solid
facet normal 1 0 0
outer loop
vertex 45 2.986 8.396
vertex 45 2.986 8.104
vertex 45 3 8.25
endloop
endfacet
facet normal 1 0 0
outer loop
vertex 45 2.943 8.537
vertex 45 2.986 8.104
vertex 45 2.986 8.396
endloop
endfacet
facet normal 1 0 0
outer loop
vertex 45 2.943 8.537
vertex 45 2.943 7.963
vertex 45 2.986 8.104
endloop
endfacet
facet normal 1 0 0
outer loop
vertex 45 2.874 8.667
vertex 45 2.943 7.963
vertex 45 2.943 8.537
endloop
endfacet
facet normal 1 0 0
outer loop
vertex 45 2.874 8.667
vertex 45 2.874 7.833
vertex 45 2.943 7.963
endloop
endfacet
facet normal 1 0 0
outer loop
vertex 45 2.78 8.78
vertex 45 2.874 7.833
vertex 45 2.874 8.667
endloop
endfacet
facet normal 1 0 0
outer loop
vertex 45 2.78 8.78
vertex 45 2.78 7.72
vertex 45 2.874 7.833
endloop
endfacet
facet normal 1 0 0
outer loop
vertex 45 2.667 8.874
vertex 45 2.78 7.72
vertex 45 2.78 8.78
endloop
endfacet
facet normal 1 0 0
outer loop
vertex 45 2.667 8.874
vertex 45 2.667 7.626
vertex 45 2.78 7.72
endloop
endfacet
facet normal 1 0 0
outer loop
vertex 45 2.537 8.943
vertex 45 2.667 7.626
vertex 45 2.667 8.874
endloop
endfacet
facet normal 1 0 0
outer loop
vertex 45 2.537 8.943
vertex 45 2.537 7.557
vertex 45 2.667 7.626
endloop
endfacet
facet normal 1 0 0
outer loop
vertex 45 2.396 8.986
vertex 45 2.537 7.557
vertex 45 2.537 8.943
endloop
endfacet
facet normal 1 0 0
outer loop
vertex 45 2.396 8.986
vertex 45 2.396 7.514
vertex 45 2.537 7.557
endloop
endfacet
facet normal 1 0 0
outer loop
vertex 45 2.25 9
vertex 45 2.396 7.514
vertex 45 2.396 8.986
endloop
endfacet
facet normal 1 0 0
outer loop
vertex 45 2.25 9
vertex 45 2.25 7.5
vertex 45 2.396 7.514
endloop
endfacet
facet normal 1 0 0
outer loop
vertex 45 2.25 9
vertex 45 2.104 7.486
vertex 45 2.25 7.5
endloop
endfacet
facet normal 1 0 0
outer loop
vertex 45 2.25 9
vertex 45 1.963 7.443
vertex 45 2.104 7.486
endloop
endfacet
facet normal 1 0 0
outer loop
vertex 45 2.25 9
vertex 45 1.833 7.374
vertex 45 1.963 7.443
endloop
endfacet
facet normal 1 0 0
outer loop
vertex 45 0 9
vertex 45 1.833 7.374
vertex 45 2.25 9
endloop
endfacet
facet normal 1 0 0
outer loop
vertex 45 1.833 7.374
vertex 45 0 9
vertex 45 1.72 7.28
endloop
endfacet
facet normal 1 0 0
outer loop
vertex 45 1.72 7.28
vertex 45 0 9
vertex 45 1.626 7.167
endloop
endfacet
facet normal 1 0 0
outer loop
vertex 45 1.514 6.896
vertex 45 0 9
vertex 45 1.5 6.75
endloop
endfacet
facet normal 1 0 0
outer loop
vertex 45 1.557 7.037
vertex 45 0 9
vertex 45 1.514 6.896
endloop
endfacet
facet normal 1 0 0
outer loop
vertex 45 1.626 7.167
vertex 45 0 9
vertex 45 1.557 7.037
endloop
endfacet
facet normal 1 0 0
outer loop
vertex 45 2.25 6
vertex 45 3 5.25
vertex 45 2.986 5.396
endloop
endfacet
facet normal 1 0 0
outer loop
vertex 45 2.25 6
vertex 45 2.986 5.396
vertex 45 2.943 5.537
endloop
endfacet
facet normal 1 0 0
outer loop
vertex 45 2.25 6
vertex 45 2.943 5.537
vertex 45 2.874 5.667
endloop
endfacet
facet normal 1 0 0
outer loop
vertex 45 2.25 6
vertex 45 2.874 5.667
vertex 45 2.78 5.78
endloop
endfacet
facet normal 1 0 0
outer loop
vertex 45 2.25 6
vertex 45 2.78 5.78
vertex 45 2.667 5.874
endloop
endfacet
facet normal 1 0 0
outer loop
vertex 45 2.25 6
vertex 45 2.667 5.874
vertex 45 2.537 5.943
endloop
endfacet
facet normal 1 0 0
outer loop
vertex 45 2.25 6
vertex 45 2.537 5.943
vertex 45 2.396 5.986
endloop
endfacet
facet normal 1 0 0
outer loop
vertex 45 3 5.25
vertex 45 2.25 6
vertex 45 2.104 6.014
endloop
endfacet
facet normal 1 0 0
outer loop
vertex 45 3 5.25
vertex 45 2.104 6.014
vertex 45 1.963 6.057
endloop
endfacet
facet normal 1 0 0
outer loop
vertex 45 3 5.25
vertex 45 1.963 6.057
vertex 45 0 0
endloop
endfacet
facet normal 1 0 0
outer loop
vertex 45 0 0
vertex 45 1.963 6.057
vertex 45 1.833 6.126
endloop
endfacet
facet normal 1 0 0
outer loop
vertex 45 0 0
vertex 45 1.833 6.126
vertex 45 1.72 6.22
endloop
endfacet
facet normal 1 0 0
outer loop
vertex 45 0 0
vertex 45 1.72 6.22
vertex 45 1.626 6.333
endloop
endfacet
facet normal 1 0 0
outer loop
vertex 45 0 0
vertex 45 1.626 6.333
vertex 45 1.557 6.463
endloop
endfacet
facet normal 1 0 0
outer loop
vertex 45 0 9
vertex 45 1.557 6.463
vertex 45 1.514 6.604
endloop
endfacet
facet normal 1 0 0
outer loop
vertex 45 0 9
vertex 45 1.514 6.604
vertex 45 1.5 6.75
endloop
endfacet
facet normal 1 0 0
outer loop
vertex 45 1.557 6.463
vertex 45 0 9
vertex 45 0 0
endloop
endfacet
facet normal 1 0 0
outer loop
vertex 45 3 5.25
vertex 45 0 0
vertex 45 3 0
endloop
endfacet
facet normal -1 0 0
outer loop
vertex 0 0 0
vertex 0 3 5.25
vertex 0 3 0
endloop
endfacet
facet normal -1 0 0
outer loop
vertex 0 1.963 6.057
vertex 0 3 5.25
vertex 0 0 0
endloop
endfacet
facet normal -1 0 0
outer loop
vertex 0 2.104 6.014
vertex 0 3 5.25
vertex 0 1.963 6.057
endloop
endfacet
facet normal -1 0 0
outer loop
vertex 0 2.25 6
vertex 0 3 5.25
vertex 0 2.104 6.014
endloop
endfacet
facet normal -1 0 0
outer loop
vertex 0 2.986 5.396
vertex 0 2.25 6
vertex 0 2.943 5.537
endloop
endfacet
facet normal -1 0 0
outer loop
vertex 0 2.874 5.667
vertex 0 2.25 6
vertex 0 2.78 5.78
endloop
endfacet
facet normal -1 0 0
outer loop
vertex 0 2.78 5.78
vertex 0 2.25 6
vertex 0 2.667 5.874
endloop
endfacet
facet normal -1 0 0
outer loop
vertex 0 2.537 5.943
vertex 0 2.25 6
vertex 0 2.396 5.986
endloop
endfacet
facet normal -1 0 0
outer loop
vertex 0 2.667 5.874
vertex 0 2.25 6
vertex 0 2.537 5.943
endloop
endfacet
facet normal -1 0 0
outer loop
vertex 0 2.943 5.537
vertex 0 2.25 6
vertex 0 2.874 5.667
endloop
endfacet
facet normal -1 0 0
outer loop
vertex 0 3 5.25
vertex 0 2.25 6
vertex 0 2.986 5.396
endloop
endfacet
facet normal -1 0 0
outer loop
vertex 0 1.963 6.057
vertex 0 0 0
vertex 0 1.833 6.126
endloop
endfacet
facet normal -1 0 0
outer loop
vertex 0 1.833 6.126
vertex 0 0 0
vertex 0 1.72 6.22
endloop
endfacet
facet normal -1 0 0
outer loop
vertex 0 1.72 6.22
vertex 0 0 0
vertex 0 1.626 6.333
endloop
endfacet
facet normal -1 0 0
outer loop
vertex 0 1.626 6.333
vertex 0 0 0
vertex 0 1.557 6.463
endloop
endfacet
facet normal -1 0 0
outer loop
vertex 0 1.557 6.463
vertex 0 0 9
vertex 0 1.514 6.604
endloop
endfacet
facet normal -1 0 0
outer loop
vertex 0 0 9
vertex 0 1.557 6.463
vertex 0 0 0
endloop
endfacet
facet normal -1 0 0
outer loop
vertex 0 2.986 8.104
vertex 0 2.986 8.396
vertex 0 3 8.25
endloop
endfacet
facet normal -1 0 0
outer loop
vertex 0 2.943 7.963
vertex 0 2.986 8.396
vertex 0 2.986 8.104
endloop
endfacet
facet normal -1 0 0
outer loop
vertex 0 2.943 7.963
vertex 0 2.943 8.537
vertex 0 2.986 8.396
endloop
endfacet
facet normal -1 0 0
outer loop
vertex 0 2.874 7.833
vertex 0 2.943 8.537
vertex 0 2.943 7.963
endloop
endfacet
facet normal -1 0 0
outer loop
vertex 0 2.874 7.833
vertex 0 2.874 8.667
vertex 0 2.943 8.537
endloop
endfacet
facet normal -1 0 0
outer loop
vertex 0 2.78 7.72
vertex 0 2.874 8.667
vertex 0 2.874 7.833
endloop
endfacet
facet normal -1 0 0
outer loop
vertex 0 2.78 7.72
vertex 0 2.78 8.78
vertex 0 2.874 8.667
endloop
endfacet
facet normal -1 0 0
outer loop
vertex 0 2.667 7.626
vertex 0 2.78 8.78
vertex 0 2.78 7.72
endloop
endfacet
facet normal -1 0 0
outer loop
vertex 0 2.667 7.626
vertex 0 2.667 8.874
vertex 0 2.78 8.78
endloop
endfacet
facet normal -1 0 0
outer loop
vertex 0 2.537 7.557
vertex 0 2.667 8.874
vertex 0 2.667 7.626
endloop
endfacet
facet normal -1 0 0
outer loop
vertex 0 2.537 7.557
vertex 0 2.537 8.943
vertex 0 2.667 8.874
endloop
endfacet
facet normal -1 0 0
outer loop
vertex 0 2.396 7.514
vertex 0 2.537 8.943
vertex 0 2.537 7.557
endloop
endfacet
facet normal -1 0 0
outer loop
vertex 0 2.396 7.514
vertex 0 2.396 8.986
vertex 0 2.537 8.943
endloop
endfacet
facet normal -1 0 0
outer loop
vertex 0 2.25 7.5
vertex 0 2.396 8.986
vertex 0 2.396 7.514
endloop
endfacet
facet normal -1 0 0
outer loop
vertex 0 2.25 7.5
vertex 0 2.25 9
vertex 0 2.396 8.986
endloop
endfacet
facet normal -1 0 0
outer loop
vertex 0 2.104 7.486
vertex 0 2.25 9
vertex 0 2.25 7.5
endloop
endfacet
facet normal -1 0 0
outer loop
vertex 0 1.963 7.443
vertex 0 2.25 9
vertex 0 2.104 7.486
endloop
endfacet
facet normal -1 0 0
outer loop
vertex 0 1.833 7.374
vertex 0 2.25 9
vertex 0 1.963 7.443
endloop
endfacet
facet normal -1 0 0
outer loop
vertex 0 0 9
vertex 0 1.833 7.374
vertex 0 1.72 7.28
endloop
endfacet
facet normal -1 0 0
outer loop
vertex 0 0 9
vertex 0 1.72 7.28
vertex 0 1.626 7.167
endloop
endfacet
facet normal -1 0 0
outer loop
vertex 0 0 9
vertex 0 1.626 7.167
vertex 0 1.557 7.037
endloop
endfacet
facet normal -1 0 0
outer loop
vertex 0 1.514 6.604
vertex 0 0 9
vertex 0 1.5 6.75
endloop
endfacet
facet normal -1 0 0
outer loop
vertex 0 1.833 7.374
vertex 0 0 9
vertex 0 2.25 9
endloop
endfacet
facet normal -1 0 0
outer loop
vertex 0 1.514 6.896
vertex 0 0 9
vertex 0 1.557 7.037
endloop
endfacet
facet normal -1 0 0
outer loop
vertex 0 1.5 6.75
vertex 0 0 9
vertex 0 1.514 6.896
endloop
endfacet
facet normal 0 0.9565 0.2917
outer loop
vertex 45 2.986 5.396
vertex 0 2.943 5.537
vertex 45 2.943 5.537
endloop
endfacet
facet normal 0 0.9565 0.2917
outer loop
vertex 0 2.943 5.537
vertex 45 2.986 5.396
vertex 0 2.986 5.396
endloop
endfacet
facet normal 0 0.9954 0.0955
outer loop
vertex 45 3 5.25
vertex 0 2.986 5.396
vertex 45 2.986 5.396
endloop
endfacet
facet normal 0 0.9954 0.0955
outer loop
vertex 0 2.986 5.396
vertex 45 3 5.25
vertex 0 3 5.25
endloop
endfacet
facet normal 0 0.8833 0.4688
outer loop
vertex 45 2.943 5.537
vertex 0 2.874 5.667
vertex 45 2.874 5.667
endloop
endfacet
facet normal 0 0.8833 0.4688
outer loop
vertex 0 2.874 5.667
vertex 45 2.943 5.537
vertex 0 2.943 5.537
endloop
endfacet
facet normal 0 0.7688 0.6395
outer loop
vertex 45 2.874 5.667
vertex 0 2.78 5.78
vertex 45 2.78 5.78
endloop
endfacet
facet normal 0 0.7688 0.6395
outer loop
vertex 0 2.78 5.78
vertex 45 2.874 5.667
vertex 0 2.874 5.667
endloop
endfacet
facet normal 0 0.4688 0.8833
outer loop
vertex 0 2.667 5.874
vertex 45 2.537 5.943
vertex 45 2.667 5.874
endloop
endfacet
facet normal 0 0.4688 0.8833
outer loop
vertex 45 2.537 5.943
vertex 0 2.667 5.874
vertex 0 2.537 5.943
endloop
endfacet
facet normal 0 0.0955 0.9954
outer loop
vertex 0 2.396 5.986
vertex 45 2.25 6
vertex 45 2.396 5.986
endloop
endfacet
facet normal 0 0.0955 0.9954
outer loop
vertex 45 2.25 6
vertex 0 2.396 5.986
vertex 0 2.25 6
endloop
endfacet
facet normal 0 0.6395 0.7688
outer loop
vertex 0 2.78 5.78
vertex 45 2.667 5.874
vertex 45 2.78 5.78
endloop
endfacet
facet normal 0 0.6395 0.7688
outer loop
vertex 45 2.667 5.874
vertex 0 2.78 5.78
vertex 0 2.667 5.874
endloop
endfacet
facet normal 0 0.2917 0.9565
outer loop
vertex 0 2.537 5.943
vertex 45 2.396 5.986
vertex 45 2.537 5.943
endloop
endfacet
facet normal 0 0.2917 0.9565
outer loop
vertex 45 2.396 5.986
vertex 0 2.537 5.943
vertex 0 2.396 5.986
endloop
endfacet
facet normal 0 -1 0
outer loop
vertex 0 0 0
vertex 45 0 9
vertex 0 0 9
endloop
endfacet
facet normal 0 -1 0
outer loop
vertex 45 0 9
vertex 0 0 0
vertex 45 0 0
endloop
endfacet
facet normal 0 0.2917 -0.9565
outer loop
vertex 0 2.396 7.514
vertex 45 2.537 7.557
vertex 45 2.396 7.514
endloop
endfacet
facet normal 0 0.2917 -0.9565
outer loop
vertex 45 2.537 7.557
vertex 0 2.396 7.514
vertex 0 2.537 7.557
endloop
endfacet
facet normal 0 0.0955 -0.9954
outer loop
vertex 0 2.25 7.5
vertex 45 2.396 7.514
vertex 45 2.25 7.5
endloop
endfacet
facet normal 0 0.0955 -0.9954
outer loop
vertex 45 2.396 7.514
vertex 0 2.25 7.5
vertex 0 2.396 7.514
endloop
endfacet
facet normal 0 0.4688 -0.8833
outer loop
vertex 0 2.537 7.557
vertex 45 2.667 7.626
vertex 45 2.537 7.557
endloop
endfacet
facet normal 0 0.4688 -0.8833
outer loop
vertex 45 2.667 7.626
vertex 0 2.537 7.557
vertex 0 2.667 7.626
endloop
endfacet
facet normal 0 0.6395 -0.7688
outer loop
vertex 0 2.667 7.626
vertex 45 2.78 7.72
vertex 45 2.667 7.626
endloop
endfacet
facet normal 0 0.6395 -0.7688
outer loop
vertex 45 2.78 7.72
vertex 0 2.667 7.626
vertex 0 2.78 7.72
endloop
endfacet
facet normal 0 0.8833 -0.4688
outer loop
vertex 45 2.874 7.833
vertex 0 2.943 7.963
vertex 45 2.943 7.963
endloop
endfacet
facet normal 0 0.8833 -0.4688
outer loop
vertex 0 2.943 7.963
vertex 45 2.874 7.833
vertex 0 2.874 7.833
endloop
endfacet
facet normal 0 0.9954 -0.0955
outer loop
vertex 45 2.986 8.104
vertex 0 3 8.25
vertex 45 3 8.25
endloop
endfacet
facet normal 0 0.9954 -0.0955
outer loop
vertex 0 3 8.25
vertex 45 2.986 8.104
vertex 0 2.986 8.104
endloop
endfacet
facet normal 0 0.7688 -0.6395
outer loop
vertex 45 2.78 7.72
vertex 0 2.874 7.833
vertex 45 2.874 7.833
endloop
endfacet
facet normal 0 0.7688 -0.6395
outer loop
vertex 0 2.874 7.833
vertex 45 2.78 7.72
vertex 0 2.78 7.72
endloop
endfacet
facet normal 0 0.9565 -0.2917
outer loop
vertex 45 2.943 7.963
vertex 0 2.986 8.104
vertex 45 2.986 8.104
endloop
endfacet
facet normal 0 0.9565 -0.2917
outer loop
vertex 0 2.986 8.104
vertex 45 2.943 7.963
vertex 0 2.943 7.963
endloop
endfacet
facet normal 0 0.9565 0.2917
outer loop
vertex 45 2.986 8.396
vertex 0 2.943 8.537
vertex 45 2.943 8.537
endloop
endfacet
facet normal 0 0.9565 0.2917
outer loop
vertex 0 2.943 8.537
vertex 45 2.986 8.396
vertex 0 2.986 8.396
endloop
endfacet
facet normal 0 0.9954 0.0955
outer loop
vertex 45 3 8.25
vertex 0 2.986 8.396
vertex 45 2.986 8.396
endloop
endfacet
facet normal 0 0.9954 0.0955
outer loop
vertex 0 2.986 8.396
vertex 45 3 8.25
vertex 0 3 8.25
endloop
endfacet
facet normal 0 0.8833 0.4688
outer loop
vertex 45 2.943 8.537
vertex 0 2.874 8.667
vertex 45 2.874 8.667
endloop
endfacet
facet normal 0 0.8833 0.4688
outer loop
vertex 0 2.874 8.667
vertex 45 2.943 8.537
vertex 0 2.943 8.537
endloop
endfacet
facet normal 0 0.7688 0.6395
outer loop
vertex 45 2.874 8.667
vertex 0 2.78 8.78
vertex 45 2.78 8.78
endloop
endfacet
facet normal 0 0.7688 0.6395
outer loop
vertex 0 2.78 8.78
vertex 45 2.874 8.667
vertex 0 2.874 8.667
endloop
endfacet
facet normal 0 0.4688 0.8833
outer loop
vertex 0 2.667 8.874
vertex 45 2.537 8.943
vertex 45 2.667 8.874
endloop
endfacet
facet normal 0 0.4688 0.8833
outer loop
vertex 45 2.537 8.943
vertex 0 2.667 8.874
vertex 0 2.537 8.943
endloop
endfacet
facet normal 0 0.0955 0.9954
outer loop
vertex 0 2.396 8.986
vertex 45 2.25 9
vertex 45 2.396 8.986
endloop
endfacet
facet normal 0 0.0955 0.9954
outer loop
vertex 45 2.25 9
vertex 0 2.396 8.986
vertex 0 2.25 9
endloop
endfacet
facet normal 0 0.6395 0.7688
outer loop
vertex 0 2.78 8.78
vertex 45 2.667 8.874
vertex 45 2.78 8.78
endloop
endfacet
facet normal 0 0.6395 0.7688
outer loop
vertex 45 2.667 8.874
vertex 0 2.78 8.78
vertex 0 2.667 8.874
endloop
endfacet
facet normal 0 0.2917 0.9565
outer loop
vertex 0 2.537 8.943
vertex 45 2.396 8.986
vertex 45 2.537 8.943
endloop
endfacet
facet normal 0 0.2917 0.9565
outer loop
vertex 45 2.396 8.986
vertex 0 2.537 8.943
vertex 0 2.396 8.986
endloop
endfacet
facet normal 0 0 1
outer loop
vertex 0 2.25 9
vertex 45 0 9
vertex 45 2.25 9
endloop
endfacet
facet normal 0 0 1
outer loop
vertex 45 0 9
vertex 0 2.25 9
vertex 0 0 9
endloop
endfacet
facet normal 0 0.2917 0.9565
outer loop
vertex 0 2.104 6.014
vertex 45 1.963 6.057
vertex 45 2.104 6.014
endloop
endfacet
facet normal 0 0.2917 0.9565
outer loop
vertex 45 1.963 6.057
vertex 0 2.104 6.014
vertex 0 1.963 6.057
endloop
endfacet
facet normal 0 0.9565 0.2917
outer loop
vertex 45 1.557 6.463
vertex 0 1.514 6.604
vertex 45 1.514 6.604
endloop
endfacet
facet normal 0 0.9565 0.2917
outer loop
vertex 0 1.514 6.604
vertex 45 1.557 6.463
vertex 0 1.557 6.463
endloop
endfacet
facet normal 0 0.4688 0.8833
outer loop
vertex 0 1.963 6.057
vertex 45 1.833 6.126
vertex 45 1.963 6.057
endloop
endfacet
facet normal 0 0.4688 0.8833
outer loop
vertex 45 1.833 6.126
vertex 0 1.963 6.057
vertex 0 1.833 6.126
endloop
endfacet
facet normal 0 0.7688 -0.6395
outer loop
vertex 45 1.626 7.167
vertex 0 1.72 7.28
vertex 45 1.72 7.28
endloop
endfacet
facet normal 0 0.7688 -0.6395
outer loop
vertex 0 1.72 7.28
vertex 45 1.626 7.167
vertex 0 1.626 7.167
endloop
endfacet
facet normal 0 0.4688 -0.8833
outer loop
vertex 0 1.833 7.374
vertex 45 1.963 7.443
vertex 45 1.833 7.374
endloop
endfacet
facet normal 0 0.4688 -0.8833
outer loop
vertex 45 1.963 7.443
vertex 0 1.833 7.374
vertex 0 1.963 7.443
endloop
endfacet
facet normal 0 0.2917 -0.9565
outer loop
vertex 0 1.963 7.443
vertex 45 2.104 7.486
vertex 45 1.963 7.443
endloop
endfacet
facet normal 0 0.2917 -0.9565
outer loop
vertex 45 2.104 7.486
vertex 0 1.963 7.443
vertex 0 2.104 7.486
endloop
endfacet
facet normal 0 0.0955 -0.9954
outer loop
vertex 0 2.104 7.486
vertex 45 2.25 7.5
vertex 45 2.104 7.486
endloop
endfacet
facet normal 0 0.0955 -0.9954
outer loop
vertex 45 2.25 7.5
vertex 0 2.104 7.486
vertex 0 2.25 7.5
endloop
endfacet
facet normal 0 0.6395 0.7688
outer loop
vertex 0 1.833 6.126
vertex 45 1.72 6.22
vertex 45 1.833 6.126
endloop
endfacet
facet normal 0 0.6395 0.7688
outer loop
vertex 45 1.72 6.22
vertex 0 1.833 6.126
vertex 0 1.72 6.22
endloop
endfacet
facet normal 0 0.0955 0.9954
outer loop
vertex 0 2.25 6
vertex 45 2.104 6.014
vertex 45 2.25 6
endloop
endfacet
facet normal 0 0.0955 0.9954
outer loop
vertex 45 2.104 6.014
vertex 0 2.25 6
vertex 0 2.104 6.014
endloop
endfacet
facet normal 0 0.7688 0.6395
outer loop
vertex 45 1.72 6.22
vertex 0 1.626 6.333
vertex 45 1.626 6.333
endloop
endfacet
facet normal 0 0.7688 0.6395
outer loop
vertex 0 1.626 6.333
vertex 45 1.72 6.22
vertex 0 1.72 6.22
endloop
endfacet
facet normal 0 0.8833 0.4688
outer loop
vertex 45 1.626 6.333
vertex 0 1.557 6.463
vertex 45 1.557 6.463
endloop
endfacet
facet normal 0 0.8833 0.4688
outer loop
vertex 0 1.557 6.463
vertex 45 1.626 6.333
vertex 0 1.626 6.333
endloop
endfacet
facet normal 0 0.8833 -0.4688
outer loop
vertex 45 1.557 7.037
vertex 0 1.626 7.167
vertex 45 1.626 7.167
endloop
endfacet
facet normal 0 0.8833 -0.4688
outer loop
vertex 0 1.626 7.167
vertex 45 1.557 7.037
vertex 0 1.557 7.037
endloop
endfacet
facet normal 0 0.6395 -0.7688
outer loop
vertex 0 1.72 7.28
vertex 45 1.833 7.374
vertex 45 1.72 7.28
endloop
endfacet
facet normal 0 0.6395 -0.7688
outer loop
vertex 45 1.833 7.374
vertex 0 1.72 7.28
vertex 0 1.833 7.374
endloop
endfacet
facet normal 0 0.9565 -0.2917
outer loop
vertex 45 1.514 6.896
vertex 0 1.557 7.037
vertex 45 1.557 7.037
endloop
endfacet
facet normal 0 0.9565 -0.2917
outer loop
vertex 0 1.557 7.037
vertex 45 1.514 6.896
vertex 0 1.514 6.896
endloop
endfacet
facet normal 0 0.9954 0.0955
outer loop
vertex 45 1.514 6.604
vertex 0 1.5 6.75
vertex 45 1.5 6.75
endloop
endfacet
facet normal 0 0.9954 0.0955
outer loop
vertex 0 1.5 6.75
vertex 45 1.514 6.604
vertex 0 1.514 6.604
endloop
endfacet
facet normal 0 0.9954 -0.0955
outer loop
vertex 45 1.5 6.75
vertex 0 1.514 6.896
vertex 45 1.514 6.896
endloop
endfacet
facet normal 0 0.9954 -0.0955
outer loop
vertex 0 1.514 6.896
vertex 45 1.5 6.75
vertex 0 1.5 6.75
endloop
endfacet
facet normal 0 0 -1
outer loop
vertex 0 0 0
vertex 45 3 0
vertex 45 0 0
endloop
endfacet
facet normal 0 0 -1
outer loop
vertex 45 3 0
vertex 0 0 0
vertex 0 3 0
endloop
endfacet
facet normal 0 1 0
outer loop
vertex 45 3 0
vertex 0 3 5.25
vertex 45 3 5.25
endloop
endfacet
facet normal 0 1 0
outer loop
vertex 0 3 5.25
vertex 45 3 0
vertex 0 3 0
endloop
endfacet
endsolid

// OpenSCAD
//roundedcorner(4, 10);
//roundedbox(65,45,4, 8);
//roundedshelf(65, 45, 4);
//roundedgroove(65, 3, 2);
groovedwall(length=45, height=9, thickness=3, groovedepth=4.5);

module roundedcorner(height, radius)
{
	intersection()
	{
		cube(size=[radius, radius, height]);
		color([1,0,0]) cylinder(h=height, r=radius, $fn=32);
	}
}

module roundedbox( length, width, height, radius)
{
	strutlength = length - radius*2;
	strutwidth = width - radius*2;

	translate([length-radius, width-radius, 0]) rotate([0,0,0]) roundedcorner(height, radius);

	translate([radius, width-radius, 0]) rotate([0,0,90]) roundedcorner(height, radius);
	
	translate([radius, radius, 0]) rotate([0,0,180]) roundedcorner(height, radius);
	
	translate([length-radius, radius, 0]) rotate([0,0,270]) roundedcorner(height, radius);

	// Connect corners with filler rectangles
	translate([radius, width-radius,0]) cube(size=[strutlength, radius, height]);
	translate([radius, 0,0]) cube(size=[strutlength, radius, height]);
	translate([0, radius, 0]) cube(size=[radius,strutwidth,height]);
	translate([length-radius, radius, 0]) cube(size=[radius,strutwidth,height]);

	// Fill in the center rectangle
	translate([radius, radius,0]) cube(size=[strutlength, strutwidth, height]);
}

module roundedshelf(length, width, height)
{
	rotate([0,90,0]) 
	translate([-height/2,width-(height/2),0])
	union()
	{
		roundedcorner(length, height/2);
		rotate([0,0,90]) roundedcorner(length, height/2);
	}

	cube(size=[length, width-height/2, height]);
}

module roundedgroove(length, width, height)
{
	difference()
	{
		union()
		{
			roundedshelf(length, width, height/3);
			translate([0,0,height/3]) cube(size=[length, width-height/3/2, height/3]);
			translate([0,0,(height/3)*2]) roundedshelf(length, width, height/3);
		}

		// subtract a cylinder to make the smooth bottom of the track
		rotate([0,90,0]) 
		translate([-(height/3)-(height/3)/2,width-height/3/2,-0.25]) 
			cylinder(h=length+0.5, r=(height/3)/2, $fn=32);
	}
}

module groovedwall(length, height, thickness, groovedepth)
{
	lowerwallheight = height - groovedepth + groovedepth/3/2;
	
	union()
	{
	// place the lower wall
	color([0,0,1]) cube(size=[length, thickness, lowerwallheight]);
	
	// Place the grooved portion
	translate([0,0,height-groovedepth])
	roundedgroove(length, thickness, groovedepth);
	}
}
